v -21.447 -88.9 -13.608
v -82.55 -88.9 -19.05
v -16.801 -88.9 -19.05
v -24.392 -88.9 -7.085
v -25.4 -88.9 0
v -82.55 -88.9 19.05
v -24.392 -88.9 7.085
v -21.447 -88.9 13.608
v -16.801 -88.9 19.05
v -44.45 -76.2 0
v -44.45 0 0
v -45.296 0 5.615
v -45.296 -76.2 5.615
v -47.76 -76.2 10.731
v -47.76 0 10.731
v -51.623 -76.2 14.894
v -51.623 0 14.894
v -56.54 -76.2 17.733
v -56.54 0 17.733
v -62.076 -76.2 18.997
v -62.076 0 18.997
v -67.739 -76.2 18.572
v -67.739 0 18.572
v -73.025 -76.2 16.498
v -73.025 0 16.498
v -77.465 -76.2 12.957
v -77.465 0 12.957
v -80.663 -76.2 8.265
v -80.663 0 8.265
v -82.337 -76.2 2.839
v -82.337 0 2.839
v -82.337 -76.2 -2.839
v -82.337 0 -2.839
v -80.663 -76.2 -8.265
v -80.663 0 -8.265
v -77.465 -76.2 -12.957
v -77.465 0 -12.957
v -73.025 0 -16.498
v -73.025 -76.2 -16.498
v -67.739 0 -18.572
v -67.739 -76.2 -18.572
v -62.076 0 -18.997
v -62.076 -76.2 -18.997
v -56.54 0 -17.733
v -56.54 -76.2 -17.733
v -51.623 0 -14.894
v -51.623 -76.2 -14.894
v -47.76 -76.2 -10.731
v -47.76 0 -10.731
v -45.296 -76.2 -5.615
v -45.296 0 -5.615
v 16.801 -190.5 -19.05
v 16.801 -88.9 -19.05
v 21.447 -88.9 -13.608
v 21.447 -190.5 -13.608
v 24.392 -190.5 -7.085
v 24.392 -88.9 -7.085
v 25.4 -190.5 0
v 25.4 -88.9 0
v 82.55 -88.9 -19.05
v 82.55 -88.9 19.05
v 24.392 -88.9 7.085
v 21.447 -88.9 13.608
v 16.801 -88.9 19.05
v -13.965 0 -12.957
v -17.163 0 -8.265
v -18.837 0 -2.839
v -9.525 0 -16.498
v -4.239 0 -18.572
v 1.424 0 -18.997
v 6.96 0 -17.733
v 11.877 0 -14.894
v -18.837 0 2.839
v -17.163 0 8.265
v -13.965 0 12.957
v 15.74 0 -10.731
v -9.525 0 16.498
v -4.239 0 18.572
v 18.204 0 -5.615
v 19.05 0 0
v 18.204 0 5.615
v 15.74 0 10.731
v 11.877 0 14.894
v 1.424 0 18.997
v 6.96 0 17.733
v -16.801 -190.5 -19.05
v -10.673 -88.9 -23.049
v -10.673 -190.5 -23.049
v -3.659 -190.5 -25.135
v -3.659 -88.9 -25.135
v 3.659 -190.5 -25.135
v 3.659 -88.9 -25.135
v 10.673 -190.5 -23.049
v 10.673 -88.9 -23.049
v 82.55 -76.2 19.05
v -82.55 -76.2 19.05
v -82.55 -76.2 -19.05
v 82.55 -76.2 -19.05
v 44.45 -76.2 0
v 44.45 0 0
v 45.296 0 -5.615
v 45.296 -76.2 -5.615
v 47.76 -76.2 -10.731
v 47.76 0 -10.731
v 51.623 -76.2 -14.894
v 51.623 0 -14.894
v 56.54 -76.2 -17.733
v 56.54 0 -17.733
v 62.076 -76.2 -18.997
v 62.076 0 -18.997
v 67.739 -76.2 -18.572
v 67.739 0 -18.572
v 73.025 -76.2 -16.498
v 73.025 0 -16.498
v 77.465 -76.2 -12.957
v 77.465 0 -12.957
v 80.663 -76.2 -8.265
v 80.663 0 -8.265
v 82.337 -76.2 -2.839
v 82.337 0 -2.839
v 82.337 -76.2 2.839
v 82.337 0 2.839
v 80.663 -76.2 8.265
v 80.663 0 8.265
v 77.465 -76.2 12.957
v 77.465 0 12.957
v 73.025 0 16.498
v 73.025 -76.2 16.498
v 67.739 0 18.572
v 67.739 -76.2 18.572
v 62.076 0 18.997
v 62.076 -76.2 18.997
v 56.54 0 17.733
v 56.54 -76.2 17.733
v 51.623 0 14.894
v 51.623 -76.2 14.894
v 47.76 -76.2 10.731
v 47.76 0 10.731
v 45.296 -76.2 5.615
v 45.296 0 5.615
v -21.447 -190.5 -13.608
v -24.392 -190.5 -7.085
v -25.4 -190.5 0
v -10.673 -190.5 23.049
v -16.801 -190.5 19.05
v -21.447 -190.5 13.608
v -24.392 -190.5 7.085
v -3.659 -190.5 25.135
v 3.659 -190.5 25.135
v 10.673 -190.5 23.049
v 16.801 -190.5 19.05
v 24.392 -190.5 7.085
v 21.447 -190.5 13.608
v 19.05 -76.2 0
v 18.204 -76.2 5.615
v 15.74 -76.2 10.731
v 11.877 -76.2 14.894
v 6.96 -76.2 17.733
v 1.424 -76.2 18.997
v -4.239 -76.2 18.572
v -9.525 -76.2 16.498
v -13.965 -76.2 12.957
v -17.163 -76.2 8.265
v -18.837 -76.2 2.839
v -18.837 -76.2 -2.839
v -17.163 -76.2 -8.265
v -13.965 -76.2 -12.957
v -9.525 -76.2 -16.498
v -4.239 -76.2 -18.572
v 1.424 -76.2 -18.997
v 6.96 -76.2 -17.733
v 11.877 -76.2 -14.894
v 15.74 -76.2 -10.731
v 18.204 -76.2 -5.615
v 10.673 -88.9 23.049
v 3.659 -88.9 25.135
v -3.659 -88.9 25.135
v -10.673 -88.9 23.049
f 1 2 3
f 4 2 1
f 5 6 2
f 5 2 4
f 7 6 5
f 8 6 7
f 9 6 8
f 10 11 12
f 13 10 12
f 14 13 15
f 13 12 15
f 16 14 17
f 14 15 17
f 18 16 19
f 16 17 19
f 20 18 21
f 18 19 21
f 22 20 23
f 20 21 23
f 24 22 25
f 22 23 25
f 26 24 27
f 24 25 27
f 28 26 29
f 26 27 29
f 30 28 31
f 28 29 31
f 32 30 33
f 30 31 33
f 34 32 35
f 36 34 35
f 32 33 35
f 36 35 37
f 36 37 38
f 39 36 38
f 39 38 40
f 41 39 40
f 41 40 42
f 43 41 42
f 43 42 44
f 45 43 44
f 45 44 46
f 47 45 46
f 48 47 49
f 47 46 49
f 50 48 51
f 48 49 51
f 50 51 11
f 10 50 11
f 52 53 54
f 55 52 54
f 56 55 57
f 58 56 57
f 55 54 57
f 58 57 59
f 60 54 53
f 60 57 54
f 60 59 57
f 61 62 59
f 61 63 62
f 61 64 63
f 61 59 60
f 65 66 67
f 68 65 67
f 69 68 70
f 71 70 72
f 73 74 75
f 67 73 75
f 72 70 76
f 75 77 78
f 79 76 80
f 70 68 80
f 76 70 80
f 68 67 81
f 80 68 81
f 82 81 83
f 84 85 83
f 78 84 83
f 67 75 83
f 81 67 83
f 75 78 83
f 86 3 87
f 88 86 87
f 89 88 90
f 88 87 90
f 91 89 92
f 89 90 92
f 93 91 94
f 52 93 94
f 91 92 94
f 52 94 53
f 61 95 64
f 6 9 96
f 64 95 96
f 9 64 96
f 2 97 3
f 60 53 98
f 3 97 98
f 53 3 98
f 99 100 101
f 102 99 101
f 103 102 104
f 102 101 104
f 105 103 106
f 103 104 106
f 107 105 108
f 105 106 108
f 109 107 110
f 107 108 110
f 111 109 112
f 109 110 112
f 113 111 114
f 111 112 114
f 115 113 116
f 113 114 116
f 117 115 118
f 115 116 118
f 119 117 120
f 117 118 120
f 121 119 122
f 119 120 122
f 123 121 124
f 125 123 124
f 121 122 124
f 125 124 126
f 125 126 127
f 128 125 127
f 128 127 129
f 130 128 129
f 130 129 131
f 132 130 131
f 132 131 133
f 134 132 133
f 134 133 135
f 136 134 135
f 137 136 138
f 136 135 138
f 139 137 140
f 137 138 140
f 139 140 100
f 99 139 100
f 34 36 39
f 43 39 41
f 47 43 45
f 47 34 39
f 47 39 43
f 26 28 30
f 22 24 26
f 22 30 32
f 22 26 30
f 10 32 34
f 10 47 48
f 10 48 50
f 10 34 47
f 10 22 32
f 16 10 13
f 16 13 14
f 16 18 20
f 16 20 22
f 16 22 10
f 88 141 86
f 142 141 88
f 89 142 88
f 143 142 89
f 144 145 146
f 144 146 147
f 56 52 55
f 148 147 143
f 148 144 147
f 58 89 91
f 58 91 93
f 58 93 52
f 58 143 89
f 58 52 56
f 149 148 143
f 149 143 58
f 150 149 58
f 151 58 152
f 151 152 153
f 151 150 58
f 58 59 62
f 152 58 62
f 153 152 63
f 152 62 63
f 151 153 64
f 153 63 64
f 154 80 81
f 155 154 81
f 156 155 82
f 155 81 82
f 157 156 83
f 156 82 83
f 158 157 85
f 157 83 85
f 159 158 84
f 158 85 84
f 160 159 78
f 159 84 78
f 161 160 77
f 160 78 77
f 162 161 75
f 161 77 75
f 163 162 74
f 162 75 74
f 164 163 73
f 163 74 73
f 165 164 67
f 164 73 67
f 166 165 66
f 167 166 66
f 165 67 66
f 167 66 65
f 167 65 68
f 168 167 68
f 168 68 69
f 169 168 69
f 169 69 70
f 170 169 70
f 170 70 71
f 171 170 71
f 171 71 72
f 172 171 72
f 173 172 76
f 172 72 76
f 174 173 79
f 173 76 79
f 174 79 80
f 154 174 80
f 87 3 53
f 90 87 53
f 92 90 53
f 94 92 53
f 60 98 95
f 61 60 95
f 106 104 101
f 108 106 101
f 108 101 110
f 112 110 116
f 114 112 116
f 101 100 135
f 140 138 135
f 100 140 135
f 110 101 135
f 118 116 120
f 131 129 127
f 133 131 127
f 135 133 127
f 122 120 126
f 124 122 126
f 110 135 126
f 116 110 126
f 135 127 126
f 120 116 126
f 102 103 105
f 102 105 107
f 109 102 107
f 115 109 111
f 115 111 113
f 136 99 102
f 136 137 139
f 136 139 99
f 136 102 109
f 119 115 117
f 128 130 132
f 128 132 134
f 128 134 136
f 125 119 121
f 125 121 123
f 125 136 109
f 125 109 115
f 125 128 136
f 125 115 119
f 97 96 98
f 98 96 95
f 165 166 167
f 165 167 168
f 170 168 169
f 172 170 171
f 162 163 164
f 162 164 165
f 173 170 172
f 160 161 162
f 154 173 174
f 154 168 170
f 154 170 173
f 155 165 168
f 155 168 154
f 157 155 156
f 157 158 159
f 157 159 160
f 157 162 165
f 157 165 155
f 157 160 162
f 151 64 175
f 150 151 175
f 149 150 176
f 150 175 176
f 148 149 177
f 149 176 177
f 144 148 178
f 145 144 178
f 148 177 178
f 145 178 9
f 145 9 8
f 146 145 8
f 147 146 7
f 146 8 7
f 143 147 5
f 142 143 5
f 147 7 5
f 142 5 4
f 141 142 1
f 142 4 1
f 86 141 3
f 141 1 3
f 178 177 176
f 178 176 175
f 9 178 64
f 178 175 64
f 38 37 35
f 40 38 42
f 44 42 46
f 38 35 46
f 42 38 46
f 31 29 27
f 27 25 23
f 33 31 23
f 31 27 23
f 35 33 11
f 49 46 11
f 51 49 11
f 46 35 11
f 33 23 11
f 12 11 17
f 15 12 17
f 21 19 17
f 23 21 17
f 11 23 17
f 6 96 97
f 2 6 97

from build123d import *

# Parameters (mm, degrees)
F1_DEPTH = 76.2
F0_R     = 19.05
F3_DEPTH = 12.7
F5_DEPTH = 101.6


with BuildPart() as f1:
    # F0 (on Front) → F1 (new body)
    with BuildSketch(Plane.XZ):
        with BuildLine():
            ThreePointArc((-19.05, 0), (0, -19.05), (19.05, 0))
            ThreePointArc((19.05, 0), (0, 19.05), (-19.05, 0))
        make_face()
    extrude(amount=F1_DEPTH)


with BuildPart() as f1b:
    # F0 (on Front) → F1, piece 2 (new body)
    with BuildSketch(Plane.XZ):
        with Locations((-63.5, 0)):
            Circle(F0_R)
    extrude(amount=F1_DEPTH)


with BuildPart() as f1c:
    # F0 (on Front) → F1, piece 3 (new body)
    with BuildSketch(Plane.XZ):
        with BuildLine():
            ThreePointArc((82.55, 0), (63.5, 19.05), (44.45, 0))
            ThreePointArc((44.45, 0), (63.5, -19.05), (82.55, 0))
        make_face()
    extrude(amount=F1_DEPTH)


with BuildPart() as f3:
    # F2 (on face) → F3 (new body)
    with BuildSketch(Plane.XZ.offset(76.2)):
        with BuildLine():
            ThreePointArc((-9.66e-08, -19.05), (-19.05, 1.085e-07), (1.205e-07, 19.05))
            Line((1.205e-07, 19.05), (-82.55, 19.05))
            Line((-82.55, 19.05), (-82.55, -19.05))
            Line((-82.55, -19.05), (-9.66e-08, -19.05))
        make_face()
        with BuildLine():
            Line((82.55, -19.05), (82.55, 19.05))
            Line((82.55, 19.05), (1.205e-07, 19.05))
            ThreePointArc((1.205e-07, 19.05), (13.4703842242, 13.470384139), (19.05, 0))
            ThreePointArc((19.05, 0), (13.4703841474, -13.4703842158), (-9.66e-08, -19.05))
            Line((-9.66e-08, -19.05), (82.55, -19.05))
        make_face()
        with BuildLine():
            ThreePointArc((19.05, 0), (13.4703842242, 13.470384139), (1.205e-07, 19.05))
            ThreePointArc((1.205e-07, 19.05), (-19.05, 1.085e-07), (-9.66e-08, -19.05))
            ThreePointArc((-9.66e-08, -19.05), (13.4703841474, -13.4703842158), (19.05, 0))
        make_face()
    extrude(amount=F3_DEPTH)

    # F4 (on face) → F5 (join)
    with BuildSketch(Plane.XZ.offset(88.9)):
        with BuildLine():
            Line((-16.8005208253, 19.05), (16.8005208253, 19.05))
            ThreePointArc((16.8005208253, 19.05), (0, 25.4), (-16.8005208253, 19.05))
        make_face()
        with BuildLine():
            ThreePointArc((16.8005208253, -19.05), (23.1505208253, -10.4505208253), (25.4, 0))
            ThreePointArc((25.4, 0), (23.1505208253, 10.4505208253), (16.8005208253, 19.05))
            Line((16.8005208253, 19.05), (-16.8005208253, 19.05))
            ThreePointArc((-16.8005208253, 19.05), (-25.4, 0), (-16.8005208253, -19.05))
            Line((-16.8005208253, -19.05), (16.8005208253, -19.05))
        make_face()
        with BuildLine():
            ThreePointArc((-16.8005208253, -19.05), (0, -25.4), (16.8005208253, -19.05))
            Line((16.8005208253, -19.05), (-16.8005208253, -19.05))
        make_face()
    extrude(amount=F5_DEPTH)


solid = Compound([f1.part, f1b.part, f1c.part, f3.part])
